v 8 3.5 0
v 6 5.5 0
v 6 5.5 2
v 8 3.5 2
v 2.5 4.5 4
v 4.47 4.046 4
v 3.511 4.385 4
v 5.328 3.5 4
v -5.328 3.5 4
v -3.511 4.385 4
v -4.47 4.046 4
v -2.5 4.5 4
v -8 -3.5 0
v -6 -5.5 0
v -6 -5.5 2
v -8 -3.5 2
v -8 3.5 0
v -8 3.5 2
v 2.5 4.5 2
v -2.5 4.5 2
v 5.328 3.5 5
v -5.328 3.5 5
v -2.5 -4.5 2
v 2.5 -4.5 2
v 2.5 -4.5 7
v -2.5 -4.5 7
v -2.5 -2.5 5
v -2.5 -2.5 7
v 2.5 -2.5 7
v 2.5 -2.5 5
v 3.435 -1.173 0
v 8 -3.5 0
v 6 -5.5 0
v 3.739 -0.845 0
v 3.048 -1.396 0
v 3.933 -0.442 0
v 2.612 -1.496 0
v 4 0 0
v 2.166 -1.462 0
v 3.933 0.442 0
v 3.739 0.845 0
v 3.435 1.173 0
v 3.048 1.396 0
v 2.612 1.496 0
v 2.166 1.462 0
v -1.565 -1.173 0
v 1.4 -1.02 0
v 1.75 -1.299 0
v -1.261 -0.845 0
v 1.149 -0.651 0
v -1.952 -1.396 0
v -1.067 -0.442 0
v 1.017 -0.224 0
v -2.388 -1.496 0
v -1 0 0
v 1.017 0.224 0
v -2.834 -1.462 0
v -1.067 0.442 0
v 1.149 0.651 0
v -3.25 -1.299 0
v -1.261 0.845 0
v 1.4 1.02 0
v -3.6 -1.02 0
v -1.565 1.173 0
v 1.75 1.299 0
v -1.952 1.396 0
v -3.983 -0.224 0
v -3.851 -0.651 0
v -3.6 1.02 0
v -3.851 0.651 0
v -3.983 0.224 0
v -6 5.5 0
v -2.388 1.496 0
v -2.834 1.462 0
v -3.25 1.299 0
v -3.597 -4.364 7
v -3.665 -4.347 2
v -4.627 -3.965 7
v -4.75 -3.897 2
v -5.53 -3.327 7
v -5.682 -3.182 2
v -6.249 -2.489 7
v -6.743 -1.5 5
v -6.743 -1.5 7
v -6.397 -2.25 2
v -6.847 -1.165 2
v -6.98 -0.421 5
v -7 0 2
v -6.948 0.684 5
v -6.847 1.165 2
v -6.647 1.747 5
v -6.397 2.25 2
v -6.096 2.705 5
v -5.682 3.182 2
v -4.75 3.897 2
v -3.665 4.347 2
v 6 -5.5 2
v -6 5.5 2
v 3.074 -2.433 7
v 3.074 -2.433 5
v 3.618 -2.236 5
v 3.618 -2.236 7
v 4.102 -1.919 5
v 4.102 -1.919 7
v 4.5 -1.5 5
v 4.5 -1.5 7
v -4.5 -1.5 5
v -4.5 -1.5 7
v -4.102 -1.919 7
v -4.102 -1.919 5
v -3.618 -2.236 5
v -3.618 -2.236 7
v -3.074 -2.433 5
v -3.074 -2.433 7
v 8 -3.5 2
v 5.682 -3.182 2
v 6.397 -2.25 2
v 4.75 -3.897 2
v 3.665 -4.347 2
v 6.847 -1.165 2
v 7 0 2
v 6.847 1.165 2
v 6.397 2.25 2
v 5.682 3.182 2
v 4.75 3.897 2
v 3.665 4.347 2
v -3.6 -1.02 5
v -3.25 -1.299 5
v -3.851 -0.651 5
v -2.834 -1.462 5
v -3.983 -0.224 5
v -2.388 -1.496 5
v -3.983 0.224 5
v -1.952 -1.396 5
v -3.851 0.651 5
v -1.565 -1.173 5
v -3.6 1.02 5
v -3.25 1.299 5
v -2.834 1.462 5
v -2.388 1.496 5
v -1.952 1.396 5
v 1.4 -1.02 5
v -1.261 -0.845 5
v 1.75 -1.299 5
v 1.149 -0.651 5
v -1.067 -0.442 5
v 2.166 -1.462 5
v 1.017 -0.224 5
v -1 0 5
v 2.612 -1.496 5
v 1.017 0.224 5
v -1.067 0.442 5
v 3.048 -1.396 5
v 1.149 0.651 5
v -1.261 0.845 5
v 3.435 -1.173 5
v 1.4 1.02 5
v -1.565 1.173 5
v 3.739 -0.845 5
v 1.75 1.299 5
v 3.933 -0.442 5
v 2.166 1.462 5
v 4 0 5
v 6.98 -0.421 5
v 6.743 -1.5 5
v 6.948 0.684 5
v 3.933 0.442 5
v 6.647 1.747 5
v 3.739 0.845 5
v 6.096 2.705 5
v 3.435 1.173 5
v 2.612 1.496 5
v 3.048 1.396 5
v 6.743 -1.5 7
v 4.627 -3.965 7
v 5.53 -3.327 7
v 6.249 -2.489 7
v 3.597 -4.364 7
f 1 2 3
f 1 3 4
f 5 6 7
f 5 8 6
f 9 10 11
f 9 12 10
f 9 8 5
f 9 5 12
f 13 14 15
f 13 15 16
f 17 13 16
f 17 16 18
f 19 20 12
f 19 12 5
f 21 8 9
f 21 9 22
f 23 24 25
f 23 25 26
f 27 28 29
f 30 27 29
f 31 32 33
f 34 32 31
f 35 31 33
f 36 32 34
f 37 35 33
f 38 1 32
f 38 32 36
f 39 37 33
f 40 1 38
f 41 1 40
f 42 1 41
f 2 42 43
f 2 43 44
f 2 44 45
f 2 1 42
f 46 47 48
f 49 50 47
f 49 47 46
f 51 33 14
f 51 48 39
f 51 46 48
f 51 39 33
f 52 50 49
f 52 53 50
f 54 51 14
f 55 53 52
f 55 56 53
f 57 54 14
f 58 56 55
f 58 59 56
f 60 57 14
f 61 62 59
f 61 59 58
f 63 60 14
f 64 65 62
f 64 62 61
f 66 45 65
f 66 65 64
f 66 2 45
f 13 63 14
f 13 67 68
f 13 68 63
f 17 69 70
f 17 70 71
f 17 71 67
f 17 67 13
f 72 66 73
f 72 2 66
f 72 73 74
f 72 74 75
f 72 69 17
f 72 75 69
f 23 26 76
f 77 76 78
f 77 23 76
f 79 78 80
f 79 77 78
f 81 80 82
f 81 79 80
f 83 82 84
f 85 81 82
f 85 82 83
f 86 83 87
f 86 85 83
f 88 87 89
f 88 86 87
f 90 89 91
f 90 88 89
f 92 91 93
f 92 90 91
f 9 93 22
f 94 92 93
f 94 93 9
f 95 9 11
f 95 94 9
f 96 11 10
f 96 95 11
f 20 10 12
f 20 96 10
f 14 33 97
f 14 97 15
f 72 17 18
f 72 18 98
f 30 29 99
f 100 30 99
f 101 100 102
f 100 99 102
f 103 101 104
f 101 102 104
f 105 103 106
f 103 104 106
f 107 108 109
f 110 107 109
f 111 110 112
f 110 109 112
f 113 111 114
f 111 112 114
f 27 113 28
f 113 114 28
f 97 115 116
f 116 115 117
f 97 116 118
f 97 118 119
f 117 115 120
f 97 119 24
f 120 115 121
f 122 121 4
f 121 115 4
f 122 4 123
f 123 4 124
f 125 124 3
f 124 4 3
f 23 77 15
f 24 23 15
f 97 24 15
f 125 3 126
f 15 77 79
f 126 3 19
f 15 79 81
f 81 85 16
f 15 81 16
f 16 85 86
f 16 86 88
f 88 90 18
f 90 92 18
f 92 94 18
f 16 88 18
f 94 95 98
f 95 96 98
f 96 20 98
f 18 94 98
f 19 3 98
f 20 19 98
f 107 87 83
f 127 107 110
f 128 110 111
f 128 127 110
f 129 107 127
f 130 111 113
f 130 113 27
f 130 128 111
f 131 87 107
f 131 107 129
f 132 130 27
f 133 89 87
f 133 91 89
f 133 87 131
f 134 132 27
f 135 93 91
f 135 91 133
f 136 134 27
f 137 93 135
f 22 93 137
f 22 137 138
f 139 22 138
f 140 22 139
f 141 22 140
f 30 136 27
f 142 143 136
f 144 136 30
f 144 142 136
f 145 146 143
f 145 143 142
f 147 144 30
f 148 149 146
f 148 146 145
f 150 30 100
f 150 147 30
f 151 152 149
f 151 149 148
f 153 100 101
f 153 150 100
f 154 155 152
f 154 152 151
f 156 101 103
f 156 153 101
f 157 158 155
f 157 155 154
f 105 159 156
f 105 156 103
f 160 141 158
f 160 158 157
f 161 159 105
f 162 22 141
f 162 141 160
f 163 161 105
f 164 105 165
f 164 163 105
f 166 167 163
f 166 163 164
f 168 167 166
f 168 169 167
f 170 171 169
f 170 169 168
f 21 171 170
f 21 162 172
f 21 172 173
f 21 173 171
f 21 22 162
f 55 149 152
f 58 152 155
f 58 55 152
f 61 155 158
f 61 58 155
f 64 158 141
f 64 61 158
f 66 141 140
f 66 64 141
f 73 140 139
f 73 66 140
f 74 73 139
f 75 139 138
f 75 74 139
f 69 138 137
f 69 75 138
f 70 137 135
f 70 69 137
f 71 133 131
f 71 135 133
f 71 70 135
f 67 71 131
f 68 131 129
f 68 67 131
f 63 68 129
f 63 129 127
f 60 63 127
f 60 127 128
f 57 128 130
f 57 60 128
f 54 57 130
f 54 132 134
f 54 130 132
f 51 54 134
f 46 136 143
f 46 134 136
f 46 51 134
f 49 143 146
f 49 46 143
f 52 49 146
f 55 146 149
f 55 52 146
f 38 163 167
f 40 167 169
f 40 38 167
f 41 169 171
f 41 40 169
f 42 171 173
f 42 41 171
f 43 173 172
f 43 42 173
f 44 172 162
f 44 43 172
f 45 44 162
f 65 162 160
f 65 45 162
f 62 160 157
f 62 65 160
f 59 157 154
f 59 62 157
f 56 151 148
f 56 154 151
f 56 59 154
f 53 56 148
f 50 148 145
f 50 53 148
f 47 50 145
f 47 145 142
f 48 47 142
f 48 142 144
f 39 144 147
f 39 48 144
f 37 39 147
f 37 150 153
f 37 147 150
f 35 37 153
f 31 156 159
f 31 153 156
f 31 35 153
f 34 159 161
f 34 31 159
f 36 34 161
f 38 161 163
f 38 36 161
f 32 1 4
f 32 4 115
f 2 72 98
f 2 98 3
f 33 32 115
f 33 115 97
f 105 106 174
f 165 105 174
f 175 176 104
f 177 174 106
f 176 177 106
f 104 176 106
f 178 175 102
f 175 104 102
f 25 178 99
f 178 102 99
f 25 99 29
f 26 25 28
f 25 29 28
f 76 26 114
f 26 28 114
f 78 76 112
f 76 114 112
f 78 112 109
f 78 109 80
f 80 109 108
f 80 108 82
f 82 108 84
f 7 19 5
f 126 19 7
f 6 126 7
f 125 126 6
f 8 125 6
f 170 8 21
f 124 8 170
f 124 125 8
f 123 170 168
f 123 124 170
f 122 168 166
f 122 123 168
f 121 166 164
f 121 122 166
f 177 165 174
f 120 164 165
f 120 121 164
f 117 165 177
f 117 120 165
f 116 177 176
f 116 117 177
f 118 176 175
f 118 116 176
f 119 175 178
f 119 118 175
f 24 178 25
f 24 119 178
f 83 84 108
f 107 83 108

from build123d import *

# Parameters (mm, degrees)
SKETCH1_R           = 1.5
BOSS_EXTRUDE1_DEPTH = 2
SKETCH2_R           = 1.5
BOSS_EXTRUDE2_DEPTH = 5
CUT_EXTRUDE1_DEPTH  = 2
SKETCH5_W           = 3
SKETCH5_H           = 1
CUT_EXTRUDE2_DEPTH  = 22


with BuildPart() as part:
    # Sketch1 → Boss-Extrude1 (new body)
    with BuildSketch(Plane.XY):
        Polygon((-8, 3.5), (-6, 5.5), (6, 5.5), (8, 3.5), (8, -3.5), (6, -5.5), (-6, -5.5), (-8, -3.5), align=None)
        with Locations((-2.5, 0)):
            Circle(SKETCH1_R, mode=Mode.SUBTRACT)
        with Locations((2.5, 0)):
            Circle(SKETCH1_R, mode=Mode.SUBTRACT)
    extrude(amount=BOSS_EXTRUDE1_DEPTH)

    # Sketch2 → Boss-Extrude2 (add)
    with BuildSketch(Plane.XY.offset(2)):
        with BuildLine():
            Line((-2.5, 4.5), (2.5, 4.5))
            ThreePointArc((2.5, 4.5), (7, 0), (2.5, -4.5))
            Line((2.5, -4.5), (-2.5, -4.5))
            ThreePointArc((-2.5, -4.5), (-7, 0), (-2.5, 4.5))
        make_face()
        with Locations((-2.5, 0)):
            Circle(SKETCH2_R, mode=Mode.SUBTRACT)
        with Locations((2.5, 0)):
            Circle(SKETCH2_R, mode=Mode.SUBTRACT)
    extrude(amount=BOSS_EXTRUDE2_DEPTH)

    # Sketch4 → Cut-Extrude1 (cut)
    with BuildSketch(Plane.XY.offset(7)):
        with BuildLine():
            Line((-2.5, -2.5), (2.5, -2.5))
            ThreePointArc((2.5, -2.5), (3.618033989, -2.236067977), (4.5, -1.5))
            Line((4.5, -1.5), (7.291771179, -1.5))
            Line((7.291771179, -1.5), (6.980260776, 3.5))
            Line((6.980260776, 3.5), (4.540127242, 3.5))
            Line((4.540127242, 3.5), (-4.895055756, 3.5))
            Line((-4.895055756, 3.5), (-6.610543574, 3.5))
            Line((-6.610543574, 3.5), (-7.482128219, -1.5))
            Line((-7.482128219, -1.5), (-4.5, -1.5))
            ThreePointArc((-4.5, -1.5), (-3.618033989, -2.236067977), (-2.5, -2.5))
        make_face()
    extrude(amount=-CUT_EXTRUDE1_DEPTH, mode=Mode.SUBTRACT)

    # Sketch5 → Cut-Extrude2 (cut)
    with BuildSketch(Plane.ZY.offset(8)):
        with Locations((5.5, 4)):
            Rectangle(SKETCH5_W, SKETCH5_H)
    extrude(amount=-CUT_EXTRUDE2_DEPTH, mode=Mode.SUBTRACT)


solid = part.part
